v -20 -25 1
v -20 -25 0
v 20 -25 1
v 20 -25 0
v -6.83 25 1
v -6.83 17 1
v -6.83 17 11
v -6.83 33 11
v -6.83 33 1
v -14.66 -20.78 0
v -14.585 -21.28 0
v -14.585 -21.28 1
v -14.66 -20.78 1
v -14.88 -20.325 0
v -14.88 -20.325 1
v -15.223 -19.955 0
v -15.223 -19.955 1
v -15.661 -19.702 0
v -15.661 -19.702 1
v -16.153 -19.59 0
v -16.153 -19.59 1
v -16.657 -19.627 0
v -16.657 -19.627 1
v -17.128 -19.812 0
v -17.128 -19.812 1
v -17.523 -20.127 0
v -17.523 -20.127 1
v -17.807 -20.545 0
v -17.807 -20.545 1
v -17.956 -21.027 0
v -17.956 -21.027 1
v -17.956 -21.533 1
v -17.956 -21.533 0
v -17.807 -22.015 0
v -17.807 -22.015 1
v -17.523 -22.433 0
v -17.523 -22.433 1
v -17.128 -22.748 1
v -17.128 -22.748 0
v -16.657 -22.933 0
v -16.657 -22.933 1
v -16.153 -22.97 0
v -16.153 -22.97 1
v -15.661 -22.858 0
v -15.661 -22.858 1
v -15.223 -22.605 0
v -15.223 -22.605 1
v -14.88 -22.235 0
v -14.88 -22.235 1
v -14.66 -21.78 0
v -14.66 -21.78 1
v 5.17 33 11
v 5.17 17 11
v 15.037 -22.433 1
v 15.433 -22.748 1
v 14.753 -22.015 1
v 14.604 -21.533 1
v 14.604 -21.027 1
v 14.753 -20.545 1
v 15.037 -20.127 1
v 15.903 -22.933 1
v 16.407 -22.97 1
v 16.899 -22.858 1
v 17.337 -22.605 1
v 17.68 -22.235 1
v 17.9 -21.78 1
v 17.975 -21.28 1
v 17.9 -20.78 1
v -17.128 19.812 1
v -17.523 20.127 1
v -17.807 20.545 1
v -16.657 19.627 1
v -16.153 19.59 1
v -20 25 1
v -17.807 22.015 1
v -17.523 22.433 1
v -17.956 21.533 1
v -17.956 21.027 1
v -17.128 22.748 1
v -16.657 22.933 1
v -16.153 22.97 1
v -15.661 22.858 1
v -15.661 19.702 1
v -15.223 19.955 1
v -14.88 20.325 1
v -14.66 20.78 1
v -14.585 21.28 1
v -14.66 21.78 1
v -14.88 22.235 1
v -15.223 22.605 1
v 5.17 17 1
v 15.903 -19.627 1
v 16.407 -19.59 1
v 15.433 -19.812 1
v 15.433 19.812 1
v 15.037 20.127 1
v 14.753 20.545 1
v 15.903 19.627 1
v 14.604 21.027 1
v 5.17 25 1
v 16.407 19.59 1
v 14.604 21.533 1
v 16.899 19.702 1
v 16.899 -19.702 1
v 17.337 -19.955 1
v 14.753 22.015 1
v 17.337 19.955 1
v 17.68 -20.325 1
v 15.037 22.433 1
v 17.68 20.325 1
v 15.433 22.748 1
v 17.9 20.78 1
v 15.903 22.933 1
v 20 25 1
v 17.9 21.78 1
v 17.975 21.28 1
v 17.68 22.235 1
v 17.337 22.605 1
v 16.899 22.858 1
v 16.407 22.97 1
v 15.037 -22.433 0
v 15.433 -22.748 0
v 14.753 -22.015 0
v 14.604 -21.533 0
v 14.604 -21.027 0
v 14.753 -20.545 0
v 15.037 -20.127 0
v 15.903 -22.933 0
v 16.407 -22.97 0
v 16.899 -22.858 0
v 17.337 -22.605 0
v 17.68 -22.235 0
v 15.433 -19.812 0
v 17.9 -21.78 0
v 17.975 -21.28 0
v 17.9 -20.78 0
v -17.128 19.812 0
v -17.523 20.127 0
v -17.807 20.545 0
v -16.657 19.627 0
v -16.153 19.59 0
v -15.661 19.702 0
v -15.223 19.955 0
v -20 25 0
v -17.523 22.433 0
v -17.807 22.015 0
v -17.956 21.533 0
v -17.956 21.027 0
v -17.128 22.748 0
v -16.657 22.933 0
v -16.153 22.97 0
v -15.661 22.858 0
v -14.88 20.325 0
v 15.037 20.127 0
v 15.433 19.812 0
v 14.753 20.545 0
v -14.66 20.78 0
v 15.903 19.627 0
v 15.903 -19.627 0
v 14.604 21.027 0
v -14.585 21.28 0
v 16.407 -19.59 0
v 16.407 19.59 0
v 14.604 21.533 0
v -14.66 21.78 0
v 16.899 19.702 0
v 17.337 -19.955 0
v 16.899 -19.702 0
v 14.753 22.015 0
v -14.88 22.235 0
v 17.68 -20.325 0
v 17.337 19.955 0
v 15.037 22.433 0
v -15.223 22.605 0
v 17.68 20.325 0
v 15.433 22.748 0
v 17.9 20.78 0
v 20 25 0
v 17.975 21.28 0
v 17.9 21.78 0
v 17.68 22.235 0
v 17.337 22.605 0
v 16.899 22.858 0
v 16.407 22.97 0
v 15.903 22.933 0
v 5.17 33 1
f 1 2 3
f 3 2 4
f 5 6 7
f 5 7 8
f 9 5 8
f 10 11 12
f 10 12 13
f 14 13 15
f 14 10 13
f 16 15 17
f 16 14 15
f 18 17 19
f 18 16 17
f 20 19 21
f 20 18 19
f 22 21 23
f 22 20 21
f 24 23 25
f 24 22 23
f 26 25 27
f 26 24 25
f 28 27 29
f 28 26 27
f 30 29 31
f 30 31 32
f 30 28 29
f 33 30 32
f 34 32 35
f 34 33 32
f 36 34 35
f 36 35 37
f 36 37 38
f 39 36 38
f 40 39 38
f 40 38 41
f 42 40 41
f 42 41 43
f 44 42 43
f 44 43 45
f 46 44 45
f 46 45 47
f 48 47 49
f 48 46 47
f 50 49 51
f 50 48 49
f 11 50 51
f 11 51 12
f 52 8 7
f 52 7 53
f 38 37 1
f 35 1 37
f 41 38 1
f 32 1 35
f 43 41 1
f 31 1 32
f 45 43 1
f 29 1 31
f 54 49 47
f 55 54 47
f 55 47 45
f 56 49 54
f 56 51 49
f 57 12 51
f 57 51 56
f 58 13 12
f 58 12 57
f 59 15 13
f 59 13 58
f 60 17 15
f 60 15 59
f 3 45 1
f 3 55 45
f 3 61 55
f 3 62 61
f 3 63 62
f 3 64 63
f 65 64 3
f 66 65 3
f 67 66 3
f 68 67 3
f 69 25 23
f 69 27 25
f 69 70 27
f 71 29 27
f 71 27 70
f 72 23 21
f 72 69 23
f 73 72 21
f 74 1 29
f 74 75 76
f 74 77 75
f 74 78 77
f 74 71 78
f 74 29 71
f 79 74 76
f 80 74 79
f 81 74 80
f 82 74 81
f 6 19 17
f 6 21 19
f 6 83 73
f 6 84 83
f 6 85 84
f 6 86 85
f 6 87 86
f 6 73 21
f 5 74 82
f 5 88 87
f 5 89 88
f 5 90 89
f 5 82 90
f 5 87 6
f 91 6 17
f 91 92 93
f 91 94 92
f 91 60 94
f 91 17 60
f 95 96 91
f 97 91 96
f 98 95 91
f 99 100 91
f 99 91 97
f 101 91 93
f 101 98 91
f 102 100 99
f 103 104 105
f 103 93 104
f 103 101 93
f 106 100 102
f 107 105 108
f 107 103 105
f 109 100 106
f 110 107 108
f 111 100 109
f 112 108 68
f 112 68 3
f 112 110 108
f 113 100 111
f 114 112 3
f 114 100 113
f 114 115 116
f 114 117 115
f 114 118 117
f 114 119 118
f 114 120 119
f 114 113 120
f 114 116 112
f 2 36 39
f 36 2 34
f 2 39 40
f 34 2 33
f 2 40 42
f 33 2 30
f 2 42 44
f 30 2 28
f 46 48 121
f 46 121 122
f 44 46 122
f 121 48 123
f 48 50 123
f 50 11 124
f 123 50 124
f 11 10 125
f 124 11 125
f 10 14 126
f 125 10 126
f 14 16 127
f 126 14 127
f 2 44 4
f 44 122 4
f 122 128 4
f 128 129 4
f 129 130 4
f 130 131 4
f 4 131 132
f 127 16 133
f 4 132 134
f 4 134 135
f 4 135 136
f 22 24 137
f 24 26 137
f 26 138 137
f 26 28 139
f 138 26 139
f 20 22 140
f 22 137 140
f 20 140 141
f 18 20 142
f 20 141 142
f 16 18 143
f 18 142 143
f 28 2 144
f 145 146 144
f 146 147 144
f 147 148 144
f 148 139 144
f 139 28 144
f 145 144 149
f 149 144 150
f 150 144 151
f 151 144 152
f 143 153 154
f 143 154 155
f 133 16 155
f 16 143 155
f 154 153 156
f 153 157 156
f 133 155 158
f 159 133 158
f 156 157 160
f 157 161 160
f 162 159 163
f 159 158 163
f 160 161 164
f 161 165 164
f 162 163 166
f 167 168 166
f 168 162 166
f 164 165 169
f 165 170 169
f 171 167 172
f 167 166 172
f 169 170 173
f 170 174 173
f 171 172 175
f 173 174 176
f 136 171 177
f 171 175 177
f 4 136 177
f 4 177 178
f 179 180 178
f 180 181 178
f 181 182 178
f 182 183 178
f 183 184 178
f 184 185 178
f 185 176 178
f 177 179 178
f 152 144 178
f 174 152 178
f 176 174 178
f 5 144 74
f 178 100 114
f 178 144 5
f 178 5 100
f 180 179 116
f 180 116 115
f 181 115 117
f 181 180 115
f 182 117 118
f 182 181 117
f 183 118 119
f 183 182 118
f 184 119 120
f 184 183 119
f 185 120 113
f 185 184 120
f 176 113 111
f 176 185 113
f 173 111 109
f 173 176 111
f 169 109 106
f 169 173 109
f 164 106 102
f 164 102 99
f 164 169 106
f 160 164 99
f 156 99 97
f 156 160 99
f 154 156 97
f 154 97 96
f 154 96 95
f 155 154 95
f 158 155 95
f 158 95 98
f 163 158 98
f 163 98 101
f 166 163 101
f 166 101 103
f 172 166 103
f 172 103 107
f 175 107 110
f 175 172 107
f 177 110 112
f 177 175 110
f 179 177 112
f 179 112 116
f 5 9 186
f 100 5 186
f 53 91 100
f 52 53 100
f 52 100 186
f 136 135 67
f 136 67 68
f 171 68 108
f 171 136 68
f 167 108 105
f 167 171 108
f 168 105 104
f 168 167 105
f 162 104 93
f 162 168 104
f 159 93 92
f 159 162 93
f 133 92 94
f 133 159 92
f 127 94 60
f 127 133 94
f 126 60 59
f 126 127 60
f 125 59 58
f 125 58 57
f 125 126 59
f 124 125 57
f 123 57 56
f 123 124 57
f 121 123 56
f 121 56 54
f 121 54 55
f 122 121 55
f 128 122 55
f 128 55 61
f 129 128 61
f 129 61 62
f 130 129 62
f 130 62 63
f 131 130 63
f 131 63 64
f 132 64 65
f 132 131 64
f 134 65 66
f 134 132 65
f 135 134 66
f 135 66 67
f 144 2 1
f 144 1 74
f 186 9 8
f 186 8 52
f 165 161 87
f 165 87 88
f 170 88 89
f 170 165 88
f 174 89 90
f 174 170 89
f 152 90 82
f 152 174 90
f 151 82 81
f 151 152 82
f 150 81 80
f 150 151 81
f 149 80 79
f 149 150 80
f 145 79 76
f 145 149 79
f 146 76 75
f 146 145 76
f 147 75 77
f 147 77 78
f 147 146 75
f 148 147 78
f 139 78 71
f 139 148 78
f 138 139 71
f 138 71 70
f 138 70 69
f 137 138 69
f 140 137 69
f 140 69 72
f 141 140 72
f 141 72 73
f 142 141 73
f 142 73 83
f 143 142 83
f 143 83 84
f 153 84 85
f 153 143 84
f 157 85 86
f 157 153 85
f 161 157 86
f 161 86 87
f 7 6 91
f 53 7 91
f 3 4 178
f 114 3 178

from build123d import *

# Parameters (mm, degrees)
F0_W     = 40
F0_H     = 50
F0_R     = 1.695
F1_DEPTH = 1
F2_W     = 12
F2_H     = 16
F3_DEPTH = 10


with BuildPart() as f1:
    # F0 (on Top) → F1 (new body)
    with BuildSketch(Plane.XY):
        Rectangle(F0_W, F0_H)
        with Locations((-16.28, -21.28)):
            Circle(F0_R, mode=Mode.SUBTRACT)
        with Locations((16.28, -21.28)):
            Circle(F0_R, mode=Mode.SUBTRACT)
        with Locations((-16.28, 21.28)):
            Circle(F0_R, mode=Mode.SUBTRACT)
        with Locations((16.28, 21.28)):
            Circle(F0_R, mode=Mode.SUBTRACT)
    extrude(amount=F1_DEPTH)

    # F2 (on face) → F3 (join)
    with BuildSketch(Plane.XY.offset(1)):
        with Locations((-0.82982, 25)):
            Rectangle(F2_W, F2_H)
    extrude(amount=F3_DEPTH)


solid = f1.part
